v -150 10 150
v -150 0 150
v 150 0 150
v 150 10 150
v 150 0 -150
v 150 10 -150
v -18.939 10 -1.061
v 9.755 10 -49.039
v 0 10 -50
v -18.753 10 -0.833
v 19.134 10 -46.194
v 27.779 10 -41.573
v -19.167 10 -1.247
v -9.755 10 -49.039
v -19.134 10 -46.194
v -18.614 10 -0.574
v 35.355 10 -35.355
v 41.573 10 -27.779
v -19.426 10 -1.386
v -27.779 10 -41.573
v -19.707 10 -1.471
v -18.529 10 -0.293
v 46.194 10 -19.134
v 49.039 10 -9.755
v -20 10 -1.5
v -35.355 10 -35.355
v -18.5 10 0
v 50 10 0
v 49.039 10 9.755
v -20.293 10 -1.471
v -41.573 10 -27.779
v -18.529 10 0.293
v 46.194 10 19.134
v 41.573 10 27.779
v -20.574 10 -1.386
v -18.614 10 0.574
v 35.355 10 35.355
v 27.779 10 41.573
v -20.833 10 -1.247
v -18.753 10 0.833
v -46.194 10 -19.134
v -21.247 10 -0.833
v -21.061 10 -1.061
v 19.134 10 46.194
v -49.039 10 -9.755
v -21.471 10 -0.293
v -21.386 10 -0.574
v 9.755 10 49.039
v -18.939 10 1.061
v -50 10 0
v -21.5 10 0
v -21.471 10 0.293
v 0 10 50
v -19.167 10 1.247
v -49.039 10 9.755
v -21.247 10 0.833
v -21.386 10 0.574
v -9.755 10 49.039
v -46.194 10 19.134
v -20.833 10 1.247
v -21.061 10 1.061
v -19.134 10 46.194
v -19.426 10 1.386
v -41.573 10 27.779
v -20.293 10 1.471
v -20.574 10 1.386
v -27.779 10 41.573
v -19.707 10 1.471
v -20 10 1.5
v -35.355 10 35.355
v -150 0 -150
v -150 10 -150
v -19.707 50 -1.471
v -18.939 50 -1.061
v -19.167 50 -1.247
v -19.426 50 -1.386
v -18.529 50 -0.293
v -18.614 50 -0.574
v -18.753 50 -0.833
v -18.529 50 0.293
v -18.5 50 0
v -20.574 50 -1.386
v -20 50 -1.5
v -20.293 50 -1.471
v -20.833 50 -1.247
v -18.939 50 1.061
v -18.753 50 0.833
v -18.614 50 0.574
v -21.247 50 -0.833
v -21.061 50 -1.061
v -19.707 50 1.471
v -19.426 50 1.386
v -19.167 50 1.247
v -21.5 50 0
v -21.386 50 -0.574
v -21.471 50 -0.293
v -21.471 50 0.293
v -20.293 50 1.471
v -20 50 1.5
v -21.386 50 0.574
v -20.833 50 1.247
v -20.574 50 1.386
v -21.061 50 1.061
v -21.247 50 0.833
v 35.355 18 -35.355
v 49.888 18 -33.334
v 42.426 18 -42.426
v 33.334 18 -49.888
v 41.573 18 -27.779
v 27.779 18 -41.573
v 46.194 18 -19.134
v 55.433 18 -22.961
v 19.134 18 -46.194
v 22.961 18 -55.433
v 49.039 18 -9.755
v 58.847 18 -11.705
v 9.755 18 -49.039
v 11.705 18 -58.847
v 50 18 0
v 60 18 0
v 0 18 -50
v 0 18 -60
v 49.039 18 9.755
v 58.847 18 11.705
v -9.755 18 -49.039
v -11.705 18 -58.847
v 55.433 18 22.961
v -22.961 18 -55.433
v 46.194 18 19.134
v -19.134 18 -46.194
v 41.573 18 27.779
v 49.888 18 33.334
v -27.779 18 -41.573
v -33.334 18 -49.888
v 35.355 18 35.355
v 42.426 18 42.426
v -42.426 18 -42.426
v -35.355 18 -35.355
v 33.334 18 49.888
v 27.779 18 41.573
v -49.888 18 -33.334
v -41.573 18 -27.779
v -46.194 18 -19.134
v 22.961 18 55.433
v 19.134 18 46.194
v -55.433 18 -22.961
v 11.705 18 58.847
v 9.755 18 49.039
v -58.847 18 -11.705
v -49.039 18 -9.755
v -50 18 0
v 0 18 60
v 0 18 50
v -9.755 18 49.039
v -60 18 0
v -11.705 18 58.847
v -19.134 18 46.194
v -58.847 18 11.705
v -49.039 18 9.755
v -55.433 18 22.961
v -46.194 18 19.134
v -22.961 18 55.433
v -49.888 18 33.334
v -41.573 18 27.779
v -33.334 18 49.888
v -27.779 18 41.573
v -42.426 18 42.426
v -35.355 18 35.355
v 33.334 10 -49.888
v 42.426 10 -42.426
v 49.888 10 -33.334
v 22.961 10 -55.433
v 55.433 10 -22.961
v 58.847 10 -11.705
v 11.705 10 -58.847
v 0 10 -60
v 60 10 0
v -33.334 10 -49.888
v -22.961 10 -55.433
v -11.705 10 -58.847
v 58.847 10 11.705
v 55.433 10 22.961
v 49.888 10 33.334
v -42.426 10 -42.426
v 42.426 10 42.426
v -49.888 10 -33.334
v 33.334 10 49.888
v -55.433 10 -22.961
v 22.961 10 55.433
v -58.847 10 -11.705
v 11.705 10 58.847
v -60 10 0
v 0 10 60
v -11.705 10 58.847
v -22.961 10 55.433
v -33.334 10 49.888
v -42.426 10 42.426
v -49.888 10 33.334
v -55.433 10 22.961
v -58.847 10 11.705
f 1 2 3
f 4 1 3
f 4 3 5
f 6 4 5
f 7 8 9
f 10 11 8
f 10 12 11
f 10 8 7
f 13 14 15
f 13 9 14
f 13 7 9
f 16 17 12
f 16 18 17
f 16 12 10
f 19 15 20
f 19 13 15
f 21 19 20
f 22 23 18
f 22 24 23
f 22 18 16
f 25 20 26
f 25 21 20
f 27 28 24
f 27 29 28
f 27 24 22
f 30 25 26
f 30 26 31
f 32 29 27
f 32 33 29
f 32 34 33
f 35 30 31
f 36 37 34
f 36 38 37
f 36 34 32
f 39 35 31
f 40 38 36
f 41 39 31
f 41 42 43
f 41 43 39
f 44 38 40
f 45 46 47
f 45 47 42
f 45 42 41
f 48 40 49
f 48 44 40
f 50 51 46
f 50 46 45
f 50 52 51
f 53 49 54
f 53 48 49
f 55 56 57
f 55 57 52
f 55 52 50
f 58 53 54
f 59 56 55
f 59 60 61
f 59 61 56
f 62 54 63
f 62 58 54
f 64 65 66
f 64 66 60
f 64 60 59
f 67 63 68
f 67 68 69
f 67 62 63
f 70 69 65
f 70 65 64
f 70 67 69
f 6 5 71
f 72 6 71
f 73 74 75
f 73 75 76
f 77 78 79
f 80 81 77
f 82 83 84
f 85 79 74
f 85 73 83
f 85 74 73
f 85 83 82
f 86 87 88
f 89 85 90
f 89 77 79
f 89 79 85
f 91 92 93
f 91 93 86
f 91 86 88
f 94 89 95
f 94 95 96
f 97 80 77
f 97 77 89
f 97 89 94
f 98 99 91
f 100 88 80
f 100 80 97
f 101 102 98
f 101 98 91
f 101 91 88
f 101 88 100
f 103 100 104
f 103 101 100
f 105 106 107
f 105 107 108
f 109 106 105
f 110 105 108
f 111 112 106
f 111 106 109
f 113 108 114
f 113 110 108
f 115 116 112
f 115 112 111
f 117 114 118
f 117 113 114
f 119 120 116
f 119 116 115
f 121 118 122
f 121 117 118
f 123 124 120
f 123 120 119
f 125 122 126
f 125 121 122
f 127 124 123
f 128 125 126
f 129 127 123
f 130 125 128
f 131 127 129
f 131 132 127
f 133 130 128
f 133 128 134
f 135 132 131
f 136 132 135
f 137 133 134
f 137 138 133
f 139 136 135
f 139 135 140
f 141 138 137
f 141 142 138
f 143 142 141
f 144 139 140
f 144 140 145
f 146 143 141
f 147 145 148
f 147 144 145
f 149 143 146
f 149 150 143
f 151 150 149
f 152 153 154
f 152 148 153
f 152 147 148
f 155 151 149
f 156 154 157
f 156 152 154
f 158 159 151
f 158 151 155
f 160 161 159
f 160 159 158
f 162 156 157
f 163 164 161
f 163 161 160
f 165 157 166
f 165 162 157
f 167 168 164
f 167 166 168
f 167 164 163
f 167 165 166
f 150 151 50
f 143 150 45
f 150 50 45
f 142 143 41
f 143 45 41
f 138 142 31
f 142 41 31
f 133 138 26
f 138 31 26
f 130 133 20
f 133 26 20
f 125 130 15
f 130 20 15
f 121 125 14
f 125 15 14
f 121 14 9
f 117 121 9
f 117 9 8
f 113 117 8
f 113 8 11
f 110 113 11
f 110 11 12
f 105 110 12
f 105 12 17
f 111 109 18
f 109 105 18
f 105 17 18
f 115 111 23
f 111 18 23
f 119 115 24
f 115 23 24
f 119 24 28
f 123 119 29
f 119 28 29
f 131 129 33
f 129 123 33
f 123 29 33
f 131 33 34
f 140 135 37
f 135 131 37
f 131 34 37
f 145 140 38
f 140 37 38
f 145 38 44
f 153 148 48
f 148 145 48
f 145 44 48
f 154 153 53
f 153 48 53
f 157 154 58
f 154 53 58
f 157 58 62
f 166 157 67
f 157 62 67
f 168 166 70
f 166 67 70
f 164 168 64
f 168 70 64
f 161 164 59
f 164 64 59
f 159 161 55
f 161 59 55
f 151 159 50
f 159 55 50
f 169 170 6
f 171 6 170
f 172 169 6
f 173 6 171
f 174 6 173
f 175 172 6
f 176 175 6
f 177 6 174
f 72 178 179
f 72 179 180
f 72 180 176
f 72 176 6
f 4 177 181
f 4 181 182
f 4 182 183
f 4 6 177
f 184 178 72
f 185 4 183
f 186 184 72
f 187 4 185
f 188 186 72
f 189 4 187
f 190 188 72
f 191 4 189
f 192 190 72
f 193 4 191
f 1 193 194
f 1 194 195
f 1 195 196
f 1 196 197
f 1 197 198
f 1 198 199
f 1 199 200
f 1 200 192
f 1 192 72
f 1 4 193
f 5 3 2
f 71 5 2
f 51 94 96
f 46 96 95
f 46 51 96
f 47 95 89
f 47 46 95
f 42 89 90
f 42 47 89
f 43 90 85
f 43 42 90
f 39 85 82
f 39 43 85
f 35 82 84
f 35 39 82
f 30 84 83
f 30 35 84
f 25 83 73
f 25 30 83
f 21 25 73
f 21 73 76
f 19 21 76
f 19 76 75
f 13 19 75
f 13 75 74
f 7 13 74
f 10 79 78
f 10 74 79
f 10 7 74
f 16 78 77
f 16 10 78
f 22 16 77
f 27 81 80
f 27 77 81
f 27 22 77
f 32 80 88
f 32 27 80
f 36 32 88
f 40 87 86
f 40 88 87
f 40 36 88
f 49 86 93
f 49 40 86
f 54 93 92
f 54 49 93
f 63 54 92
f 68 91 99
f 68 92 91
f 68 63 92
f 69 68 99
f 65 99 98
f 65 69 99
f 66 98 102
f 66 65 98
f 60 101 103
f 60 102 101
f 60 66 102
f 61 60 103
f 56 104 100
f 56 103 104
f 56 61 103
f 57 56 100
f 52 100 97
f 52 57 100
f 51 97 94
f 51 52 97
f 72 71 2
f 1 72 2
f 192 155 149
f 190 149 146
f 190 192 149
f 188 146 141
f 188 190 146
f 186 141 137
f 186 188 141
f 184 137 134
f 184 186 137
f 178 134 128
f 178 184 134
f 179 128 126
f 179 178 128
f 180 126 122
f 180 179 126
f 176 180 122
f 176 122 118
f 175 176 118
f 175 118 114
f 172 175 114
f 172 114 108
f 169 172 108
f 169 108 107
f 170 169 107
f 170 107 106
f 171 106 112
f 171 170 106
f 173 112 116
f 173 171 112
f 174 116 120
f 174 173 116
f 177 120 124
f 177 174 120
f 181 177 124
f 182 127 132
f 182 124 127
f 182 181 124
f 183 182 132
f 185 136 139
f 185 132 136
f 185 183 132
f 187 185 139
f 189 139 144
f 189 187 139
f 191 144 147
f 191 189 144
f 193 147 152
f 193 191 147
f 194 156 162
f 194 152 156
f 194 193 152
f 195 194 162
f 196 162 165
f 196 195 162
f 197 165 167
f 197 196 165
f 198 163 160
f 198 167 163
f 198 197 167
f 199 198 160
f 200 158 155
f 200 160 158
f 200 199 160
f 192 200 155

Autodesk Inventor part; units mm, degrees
ref_plane "YZ Plane" through (0, 0, 0) normal (1, 0, 0) x (0, 1, 0)
ref_plane "XZ Plane" through (0, 0, 0) normal (0, 1, 0) x (-1, 0, 0)
ref_plane "XY Plane" through (0, 0, 0) normal (0, 0, 1) x (1, 0, 0)
sketch "Sketch1" plane through (0, 0, 0) normal (0, 1, 0) x (-1, 0, 0)
  line L0 (150, 150) -> (-150, 150)
  line L1 (-150, 150) -> (-150, -150)
  line L2 (-150, -150) -> (150, -150)
  line L3 (150, -150) -> (150, 150)
  circle A0 centre (0, 0) radius 50
  circle A1 centre (20, 0) radius 1.5
  circle A2 centre (0, 0) radius 60
  dimension "d0" = 100
  dimension "d1" = 300
  dimension "d2" = 300
  dimension "d3" = 150
  dimension "d4" = 150
  dimension "d5" = 3
  dimension "d6" = 20
  dimension "d11" = 120
extrude "Extrusion1" add sketch "Sketch1" along normal blind 10 contours L3 L2 L1 L0 | A0 | A1 | A2
extrude "Extrusion2" add sketch "Sketch1" along normal blind 50 contours A1
extrude "Extrusion3" add sketch "Sketch1" along normal blind 18 contours A2
properties part number "bottom-plate" material "Concrete"
